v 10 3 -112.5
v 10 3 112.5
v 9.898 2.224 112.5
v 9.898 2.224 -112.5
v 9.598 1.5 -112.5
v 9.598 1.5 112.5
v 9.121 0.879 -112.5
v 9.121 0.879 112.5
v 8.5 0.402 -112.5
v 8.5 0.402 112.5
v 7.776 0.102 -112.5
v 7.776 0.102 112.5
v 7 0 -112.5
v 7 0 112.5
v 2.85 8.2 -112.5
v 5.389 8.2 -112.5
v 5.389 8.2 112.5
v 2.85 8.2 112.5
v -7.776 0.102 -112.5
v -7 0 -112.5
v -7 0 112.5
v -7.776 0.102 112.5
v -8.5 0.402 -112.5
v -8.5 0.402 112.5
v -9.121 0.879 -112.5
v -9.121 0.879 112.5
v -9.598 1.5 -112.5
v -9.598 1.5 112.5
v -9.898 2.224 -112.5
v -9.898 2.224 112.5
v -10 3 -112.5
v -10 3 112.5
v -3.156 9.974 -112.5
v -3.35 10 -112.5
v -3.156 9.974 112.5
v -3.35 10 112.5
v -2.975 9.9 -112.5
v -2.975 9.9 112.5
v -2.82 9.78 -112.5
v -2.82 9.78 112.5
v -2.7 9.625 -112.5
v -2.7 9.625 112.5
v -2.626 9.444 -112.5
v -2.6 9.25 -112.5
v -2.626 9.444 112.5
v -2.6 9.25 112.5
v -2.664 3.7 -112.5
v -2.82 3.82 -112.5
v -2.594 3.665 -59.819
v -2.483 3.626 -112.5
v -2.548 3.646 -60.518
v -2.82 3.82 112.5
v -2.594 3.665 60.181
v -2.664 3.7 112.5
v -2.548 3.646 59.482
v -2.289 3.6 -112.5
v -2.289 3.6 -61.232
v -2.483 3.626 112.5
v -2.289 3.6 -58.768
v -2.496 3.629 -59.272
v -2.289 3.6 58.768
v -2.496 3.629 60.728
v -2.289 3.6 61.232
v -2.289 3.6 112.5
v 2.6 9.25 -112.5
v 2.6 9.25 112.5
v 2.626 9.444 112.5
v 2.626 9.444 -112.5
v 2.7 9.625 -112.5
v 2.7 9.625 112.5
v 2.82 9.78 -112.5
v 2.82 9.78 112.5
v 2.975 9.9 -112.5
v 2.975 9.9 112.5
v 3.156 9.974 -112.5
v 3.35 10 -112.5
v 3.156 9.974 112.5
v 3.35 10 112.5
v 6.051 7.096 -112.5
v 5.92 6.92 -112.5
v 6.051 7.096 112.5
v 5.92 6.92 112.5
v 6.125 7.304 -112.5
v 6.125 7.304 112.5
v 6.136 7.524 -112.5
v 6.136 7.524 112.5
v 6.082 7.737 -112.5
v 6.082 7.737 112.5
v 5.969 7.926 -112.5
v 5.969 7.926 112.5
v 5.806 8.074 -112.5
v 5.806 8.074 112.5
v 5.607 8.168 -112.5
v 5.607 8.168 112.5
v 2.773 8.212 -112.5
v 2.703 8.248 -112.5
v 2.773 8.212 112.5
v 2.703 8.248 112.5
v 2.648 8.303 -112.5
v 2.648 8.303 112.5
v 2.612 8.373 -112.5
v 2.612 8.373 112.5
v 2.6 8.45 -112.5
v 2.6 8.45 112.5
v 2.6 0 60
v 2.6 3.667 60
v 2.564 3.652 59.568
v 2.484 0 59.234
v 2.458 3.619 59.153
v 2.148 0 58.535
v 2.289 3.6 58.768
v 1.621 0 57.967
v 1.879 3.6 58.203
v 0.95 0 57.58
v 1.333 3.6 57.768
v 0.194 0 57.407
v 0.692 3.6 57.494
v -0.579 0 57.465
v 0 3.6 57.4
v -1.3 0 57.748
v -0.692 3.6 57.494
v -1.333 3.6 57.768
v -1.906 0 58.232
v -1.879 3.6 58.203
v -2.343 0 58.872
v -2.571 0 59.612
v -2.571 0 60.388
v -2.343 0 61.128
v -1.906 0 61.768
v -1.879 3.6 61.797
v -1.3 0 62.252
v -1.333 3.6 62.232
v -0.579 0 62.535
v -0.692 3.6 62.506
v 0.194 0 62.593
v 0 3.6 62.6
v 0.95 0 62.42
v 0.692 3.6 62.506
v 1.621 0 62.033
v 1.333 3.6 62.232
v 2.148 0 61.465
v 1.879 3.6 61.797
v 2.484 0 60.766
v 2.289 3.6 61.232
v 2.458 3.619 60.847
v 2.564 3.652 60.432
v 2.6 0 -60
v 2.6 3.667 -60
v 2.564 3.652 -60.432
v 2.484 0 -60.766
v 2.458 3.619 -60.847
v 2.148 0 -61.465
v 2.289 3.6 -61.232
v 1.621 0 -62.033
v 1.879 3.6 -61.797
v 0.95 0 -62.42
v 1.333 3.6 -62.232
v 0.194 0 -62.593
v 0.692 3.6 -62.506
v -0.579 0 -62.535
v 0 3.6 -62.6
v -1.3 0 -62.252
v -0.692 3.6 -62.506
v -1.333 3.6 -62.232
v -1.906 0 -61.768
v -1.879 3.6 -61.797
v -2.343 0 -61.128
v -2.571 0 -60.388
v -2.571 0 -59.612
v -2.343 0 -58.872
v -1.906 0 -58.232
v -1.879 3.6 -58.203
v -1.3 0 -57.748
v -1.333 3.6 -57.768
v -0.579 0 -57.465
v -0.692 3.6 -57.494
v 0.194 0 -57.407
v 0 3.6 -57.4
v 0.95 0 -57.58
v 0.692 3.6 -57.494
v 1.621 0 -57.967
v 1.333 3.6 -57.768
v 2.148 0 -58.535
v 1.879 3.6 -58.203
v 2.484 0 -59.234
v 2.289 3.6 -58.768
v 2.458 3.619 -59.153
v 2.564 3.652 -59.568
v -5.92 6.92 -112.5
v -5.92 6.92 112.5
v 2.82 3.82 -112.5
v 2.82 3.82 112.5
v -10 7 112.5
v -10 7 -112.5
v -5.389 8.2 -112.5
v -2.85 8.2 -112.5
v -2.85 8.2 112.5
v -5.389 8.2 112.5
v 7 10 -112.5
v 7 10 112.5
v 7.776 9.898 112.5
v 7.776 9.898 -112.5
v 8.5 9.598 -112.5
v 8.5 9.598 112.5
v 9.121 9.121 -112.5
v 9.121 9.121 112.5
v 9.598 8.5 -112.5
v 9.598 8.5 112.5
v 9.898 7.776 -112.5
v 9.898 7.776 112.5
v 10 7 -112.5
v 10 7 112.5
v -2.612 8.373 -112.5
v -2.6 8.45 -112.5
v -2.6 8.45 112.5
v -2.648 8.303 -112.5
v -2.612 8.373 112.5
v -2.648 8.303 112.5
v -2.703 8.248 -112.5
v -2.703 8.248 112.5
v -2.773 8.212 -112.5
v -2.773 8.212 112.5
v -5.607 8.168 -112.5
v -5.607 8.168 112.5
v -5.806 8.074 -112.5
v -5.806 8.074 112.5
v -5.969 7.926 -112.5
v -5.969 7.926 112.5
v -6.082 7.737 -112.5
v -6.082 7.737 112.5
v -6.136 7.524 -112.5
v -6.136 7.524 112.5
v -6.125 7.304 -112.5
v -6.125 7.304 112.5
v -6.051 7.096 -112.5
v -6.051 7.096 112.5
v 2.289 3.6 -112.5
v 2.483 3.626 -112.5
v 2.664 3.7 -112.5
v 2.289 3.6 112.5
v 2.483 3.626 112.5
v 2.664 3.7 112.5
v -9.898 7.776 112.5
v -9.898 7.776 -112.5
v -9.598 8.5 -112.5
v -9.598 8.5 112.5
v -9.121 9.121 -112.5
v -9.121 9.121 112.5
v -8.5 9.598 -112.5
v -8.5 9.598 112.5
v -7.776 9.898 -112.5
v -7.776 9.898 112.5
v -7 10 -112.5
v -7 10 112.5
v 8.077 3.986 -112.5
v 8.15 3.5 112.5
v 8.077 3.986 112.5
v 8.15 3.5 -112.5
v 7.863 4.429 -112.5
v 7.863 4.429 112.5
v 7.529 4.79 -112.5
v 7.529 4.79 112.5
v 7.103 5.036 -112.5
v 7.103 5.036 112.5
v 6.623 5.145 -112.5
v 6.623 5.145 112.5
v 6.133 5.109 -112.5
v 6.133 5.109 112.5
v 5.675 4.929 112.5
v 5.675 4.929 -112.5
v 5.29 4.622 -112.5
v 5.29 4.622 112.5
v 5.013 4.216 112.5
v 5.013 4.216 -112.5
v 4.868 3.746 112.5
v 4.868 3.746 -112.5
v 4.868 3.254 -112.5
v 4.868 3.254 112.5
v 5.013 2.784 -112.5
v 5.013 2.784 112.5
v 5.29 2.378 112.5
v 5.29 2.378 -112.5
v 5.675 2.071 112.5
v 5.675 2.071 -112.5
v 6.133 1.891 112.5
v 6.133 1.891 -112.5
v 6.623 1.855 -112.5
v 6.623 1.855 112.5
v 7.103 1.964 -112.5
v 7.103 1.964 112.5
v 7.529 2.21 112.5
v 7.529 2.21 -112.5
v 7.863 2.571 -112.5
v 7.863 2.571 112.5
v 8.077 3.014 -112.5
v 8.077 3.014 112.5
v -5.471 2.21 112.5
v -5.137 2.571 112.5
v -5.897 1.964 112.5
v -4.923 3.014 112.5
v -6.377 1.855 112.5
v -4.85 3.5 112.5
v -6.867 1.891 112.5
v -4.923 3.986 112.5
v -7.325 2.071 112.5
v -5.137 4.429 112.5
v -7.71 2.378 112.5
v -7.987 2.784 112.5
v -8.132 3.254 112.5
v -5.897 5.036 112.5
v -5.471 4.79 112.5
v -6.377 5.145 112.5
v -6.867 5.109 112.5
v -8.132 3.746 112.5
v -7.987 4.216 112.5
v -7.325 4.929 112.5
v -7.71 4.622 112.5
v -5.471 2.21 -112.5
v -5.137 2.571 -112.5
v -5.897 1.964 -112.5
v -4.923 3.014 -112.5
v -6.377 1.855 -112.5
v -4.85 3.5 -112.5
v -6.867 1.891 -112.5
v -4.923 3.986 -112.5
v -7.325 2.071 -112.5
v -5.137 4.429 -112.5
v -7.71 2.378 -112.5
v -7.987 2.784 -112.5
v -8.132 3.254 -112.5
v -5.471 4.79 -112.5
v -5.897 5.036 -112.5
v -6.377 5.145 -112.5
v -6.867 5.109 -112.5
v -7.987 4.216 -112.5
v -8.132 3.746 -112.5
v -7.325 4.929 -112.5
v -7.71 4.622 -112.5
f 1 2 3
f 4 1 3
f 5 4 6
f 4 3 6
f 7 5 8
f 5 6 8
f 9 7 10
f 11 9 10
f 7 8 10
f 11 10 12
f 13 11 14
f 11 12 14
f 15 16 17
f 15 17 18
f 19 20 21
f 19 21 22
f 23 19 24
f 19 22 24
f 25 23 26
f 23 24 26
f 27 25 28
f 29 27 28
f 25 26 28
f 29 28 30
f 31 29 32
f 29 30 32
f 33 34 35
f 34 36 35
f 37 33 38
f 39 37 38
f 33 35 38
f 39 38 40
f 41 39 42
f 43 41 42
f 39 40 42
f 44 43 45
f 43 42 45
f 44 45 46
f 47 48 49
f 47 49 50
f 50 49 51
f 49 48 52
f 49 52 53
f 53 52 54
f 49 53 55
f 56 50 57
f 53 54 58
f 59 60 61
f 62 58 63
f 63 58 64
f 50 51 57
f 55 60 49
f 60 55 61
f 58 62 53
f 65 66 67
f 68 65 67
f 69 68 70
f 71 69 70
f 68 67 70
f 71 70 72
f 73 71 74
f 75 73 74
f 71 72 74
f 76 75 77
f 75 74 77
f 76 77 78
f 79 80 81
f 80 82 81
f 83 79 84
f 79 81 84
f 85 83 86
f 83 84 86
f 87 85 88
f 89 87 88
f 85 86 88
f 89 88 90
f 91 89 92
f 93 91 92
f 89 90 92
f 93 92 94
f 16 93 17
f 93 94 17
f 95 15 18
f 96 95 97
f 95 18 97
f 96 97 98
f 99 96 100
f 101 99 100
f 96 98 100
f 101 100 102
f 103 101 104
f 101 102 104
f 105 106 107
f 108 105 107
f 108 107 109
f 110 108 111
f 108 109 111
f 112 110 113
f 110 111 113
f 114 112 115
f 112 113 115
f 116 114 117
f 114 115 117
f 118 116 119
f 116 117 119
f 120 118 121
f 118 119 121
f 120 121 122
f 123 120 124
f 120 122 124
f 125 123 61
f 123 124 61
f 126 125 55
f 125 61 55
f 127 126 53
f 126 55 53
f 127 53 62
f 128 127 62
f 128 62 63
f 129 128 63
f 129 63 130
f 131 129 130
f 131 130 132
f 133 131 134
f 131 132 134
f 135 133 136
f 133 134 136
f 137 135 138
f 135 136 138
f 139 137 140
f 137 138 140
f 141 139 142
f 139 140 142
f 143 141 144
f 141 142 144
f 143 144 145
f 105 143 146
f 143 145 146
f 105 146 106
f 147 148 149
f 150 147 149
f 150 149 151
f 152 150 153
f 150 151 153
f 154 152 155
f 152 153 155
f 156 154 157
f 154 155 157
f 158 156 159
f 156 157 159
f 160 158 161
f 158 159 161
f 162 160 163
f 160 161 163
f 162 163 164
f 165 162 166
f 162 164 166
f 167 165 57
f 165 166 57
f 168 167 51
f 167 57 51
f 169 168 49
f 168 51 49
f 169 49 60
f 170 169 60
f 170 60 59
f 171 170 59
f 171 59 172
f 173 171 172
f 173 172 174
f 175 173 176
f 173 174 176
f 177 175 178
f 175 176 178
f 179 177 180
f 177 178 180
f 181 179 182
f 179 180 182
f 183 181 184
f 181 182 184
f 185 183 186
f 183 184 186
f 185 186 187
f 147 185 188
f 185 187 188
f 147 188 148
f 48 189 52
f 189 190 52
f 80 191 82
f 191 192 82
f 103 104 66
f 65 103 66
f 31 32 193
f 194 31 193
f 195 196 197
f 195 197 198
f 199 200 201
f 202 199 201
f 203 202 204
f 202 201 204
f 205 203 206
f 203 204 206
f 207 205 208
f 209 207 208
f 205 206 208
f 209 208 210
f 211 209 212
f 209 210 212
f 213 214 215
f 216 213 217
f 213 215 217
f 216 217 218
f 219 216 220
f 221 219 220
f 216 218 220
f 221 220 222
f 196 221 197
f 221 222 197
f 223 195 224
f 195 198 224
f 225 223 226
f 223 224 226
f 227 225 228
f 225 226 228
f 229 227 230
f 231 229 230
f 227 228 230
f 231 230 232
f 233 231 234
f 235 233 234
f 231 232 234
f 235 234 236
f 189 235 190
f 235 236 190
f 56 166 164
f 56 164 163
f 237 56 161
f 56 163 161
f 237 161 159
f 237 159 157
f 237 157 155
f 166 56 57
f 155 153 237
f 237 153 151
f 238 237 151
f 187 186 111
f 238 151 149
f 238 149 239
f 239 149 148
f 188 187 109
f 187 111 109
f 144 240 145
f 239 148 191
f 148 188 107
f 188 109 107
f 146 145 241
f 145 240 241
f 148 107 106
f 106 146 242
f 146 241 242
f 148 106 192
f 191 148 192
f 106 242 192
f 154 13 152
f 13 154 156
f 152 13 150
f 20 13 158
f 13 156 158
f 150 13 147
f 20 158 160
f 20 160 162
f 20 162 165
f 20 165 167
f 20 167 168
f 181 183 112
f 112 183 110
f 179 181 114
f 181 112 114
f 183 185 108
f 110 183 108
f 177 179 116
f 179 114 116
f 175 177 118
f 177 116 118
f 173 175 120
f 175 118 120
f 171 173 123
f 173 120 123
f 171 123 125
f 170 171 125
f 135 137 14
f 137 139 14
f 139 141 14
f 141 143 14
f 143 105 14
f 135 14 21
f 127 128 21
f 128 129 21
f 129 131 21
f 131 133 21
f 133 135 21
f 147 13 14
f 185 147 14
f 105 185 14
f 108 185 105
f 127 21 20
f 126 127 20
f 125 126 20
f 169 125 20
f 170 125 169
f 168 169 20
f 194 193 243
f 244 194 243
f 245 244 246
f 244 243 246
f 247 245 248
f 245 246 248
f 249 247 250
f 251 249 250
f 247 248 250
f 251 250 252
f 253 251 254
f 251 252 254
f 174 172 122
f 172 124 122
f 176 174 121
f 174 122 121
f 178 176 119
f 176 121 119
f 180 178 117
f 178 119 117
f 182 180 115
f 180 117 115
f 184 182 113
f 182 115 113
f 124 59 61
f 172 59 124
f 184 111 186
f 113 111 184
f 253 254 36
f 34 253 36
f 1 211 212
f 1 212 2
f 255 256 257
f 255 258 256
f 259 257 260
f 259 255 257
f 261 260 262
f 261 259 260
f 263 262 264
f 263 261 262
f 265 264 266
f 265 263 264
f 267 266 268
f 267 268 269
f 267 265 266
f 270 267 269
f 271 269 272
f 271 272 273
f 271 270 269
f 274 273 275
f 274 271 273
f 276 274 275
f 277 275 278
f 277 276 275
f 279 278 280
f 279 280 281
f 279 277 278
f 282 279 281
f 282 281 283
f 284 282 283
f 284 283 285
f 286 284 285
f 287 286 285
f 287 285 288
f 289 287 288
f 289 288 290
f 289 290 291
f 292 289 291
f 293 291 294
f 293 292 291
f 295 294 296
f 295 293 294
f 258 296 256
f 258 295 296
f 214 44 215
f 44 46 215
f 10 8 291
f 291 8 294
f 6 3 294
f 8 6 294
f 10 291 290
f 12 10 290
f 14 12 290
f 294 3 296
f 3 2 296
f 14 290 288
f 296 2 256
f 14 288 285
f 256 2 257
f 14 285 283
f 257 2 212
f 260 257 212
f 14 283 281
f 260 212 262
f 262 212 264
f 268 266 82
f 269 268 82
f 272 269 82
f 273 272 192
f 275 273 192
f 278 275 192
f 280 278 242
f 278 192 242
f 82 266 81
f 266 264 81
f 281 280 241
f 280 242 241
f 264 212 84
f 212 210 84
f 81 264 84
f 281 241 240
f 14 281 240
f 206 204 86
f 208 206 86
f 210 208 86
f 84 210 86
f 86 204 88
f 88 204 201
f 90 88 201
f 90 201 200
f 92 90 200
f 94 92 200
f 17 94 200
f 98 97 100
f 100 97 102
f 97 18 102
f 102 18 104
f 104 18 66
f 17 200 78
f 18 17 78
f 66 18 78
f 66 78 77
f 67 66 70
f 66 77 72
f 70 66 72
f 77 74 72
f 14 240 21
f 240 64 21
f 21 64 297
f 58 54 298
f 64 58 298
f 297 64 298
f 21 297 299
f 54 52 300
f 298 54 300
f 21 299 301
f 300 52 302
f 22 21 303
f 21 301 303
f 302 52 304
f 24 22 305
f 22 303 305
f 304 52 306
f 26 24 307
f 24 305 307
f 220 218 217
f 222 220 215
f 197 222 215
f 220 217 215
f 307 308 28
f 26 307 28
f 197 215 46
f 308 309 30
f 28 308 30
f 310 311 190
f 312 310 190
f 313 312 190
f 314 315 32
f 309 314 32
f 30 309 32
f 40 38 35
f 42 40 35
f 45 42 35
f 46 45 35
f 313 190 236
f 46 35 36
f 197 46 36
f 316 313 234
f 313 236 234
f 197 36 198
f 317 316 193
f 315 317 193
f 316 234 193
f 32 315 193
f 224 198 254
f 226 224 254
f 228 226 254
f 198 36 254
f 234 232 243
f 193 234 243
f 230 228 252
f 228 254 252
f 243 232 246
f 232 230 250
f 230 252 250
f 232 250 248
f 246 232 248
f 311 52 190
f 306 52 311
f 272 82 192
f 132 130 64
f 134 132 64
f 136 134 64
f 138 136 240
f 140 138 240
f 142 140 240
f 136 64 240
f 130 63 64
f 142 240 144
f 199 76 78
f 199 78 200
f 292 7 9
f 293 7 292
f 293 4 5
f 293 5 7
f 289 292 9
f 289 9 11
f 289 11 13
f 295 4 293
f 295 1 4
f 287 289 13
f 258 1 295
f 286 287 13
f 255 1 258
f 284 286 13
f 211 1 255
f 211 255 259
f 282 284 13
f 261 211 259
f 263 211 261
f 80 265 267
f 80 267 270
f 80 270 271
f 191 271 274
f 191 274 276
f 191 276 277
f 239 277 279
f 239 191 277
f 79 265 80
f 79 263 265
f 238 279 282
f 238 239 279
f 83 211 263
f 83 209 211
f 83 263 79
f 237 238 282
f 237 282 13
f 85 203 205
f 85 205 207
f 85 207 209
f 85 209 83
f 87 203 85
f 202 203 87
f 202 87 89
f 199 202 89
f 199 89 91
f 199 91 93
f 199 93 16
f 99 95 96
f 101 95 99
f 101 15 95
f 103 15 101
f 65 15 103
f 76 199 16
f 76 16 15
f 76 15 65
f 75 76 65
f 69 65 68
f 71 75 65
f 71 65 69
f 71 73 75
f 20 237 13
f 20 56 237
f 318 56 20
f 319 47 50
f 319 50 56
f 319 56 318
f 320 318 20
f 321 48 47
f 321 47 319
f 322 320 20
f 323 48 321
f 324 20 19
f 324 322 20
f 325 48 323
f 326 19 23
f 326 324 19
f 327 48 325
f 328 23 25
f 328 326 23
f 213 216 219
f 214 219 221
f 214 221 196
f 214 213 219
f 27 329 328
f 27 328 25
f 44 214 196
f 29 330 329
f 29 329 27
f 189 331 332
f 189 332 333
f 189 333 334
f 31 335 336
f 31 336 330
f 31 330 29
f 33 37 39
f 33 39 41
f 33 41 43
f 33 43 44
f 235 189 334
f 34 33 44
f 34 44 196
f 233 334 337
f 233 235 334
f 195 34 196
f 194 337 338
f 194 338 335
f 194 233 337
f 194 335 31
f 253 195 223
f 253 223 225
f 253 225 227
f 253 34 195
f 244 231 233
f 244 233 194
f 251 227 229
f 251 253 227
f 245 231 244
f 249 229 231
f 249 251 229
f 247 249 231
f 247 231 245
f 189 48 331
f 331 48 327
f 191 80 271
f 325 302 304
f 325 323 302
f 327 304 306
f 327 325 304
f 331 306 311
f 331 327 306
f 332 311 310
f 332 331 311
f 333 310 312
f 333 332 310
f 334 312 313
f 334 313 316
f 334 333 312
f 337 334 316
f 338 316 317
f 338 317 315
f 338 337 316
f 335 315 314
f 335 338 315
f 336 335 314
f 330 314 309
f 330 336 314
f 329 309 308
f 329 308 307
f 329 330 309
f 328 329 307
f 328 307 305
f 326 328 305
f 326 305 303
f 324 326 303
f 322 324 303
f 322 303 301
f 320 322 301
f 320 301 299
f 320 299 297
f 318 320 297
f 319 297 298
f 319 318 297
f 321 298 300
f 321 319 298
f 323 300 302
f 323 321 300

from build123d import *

# Parameters (mm, degrees)
SKETCH1_R            = 1.65
BOSS_EXTRUDE1_DEPTH  = 112.5
M5_CLEARANCE_HOLE1_D = 5.2


with BuildPart() as part:
    # Sketch1 → Boss-Extrude1 (new, symmetric)
    with BuildSketch(Plane.XY):
        with BuildLine():
            Line((-7, 10), (-3.35, 10))
            ThreePointArc((-3.35, 10), (-2.819669914, 9.780330086), (-2.6, 9.25))
            Line((-2.6, 9.25), (-2.6, 8.45))
            ThreePointArc((-2.6, 8.45), (-2.673223305, 8.273223305), (-2.85, 8.2))
            Line((-2.85, 8.2), (-5.389339828, 8.2))
            ThreePointArc((-5.389339828, 8.2), (-6.082249478, 7.737012574), (-5.919669914, 6.919669914))
            Line((-5.919669914, 6.919669914), (-2.819669914, 3.819669914))
            ThreePointArc((-2.819669914, 3.819669914), (-2.576352402, 3.657090351), (-2.289339828, 3.6))
            Line((-2.289339828, 3.6), (2.289339828, 3.6))
            ThreePointArc((2.289339828, 3.6), (2.576352402, 3.657090351), (2.819669914, 3.819669914))
            Line((2.819669914, 3.819669914), (5.919669914, 6.919669914))
            ThreePointArc((5.919669914, 6.919669914), (6.082249478, 7.737012574), (5.389339828, 8.2))
            Line((5.389339828, 8.2), (2.85, 8.2))
            ThreePointArc((2.85, 8.2), (2.673223305, 8.273223305), (2.6, 8.45))
            Line((2.6, 8.45), (2.6, 9.25))
            ThreePointArc((2.6, 9.25), (2.819669914, 9.780330086), (3.35, 10))
            Line((3.35, 10), (7, 10))
            ThreePointArc((7, 10), (9.121320344, 9.121320344), (10, 7))
            Line((10, 7), (10, 3))
            ThreePointArc((10, 3), (9.121320344, 0.878679656), (7, 0))
            Line((7, 0), (-7, 0))
            ThreePointArc((-7, 0), (-9.121320344, 0.878679656), (-10, 3))
            Line((-10, 3), (-10, 7))
            ThreePointArc((-10, 7), (-9.121320344, 9.121320344), (-7, 10))
        make_face()
        with Locations((-6.5, 3.5)):
            Circle(SKETCH1_R, mode=Mode.SUBTRACT)
        with Locations((6.5, 3.5)):
            Circle(SKETCH1_R, mode=Mode.SUBTRACT)
    extrude(amount=BOSS_EXTRUDE1_DEPTH, both=True)

    # M5 Clearance Hole1 (through all)
    with Locations(Plane(origin=(0, 0, 0), x_dir=(-1, 0, 0), z_dir=(0, -1, 0))):
        with Locations((0, 60), (0, -60)):
            Hole(M5_CLEARANCE_HOLE1_D / 2)


solid = part.part
